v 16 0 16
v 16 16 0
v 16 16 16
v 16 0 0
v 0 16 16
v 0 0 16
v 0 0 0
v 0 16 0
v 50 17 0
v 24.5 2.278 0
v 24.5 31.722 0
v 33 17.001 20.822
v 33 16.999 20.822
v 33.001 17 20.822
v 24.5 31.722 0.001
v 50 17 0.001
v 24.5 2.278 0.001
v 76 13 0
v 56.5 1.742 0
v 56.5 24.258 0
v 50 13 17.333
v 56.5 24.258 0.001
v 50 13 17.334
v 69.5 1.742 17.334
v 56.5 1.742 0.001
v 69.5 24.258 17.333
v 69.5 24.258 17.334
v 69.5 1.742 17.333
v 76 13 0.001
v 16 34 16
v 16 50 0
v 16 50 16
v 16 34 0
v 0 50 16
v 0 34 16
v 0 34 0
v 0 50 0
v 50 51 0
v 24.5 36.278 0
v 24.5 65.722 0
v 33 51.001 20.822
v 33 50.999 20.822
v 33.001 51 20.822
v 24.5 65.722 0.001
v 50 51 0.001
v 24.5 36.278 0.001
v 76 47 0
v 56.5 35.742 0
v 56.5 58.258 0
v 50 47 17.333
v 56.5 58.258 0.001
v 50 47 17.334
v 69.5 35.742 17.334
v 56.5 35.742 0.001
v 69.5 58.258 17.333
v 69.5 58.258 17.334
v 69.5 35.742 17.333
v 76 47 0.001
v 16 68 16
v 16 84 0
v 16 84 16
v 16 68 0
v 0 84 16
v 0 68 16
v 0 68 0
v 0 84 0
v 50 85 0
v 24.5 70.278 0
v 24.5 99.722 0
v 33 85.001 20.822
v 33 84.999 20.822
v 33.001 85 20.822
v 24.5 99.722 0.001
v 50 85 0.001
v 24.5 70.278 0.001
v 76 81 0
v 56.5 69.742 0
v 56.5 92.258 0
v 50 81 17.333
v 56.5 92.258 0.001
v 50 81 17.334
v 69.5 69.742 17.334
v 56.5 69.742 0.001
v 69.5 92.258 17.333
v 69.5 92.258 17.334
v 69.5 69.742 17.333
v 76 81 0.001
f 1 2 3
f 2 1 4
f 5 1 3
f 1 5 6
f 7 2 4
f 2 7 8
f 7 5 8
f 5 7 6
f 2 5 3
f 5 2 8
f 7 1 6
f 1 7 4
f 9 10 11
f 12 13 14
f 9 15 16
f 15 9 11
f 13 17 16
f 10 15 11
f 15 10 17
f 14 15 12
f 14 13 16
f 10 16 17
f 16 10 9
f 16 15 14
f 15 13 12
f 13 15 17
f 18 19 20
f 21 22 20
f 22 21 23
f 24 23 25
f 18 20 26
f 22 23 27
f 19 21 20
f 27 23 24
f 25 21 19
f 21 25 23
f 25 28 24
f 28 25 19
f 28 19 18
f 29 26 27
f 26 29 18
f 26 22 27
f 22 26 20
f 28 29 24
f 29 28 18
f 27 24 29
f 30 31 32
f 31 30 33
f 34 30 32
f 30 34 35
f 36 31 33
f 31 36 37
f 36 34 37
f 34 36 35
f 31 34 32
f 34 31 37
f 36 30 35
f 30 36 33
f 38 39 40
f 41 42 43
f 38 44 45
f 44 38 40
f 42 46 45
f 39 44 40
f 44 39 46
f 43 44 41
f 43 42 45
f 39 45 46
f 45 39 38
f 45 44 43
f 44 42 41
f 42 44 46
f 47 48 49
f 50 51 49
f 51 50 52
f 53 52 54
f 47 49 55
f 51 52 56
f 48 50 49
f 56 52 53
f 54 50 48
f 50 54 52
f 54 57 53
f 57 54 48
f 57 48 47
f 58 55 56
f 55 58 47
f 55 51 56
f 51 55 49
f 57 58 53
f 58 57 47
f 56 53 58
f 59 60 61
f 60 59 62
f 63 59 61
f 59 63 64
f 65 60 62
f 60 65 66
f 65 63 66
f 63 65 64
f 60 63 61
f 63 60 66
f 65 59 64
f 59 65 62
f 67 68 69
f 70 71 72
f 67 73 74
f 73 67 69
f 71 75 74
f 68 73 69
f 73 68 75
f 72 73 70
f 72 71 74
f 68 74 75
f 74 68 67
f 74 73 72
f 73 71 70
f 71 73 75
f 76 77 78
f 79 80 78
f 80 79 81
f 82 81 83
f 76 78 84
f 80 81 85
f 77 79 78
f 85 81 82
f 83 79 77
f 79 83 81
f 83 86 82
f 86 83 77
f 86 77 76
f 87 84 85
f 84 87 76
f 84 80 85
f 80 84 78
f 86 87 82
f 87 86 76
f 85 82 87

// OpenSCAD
CUBE_W = 16;
TET_R = 17;
OCT_R = 13;

for (i=[0:2])
for (yoffs=[i * TET_R * 2])
translate([0, yoffs, 0])
union() {
    cube(CUBE_W)
        ;
    translate([CUBE_W + TET_R, TET_R, 0])
    hull() {
        linear_extrude(0.001)
        circle(r=TET_R, $fn=3)
            ;
        translate([0, 0, TET_R * sqrt(3/2)])
        linear_extrude(0.001)
        circle(r=0.001, $fn=3)
            ;
    }
        ;
    translate([CUBE_W + TET_R * 2 + OCT_R, OCT_R, 0])
    hull() {
        linear_extrude(0.001)
        circle(r=OCT_R, $fn=3)
            ;
        translate([0, 0, OCT_R * 4/3])
        linear_extrude(0.001)
        rotate(60)
        circle(r=OCT_R, $fn=3)
            ;
    }
        ;
}
